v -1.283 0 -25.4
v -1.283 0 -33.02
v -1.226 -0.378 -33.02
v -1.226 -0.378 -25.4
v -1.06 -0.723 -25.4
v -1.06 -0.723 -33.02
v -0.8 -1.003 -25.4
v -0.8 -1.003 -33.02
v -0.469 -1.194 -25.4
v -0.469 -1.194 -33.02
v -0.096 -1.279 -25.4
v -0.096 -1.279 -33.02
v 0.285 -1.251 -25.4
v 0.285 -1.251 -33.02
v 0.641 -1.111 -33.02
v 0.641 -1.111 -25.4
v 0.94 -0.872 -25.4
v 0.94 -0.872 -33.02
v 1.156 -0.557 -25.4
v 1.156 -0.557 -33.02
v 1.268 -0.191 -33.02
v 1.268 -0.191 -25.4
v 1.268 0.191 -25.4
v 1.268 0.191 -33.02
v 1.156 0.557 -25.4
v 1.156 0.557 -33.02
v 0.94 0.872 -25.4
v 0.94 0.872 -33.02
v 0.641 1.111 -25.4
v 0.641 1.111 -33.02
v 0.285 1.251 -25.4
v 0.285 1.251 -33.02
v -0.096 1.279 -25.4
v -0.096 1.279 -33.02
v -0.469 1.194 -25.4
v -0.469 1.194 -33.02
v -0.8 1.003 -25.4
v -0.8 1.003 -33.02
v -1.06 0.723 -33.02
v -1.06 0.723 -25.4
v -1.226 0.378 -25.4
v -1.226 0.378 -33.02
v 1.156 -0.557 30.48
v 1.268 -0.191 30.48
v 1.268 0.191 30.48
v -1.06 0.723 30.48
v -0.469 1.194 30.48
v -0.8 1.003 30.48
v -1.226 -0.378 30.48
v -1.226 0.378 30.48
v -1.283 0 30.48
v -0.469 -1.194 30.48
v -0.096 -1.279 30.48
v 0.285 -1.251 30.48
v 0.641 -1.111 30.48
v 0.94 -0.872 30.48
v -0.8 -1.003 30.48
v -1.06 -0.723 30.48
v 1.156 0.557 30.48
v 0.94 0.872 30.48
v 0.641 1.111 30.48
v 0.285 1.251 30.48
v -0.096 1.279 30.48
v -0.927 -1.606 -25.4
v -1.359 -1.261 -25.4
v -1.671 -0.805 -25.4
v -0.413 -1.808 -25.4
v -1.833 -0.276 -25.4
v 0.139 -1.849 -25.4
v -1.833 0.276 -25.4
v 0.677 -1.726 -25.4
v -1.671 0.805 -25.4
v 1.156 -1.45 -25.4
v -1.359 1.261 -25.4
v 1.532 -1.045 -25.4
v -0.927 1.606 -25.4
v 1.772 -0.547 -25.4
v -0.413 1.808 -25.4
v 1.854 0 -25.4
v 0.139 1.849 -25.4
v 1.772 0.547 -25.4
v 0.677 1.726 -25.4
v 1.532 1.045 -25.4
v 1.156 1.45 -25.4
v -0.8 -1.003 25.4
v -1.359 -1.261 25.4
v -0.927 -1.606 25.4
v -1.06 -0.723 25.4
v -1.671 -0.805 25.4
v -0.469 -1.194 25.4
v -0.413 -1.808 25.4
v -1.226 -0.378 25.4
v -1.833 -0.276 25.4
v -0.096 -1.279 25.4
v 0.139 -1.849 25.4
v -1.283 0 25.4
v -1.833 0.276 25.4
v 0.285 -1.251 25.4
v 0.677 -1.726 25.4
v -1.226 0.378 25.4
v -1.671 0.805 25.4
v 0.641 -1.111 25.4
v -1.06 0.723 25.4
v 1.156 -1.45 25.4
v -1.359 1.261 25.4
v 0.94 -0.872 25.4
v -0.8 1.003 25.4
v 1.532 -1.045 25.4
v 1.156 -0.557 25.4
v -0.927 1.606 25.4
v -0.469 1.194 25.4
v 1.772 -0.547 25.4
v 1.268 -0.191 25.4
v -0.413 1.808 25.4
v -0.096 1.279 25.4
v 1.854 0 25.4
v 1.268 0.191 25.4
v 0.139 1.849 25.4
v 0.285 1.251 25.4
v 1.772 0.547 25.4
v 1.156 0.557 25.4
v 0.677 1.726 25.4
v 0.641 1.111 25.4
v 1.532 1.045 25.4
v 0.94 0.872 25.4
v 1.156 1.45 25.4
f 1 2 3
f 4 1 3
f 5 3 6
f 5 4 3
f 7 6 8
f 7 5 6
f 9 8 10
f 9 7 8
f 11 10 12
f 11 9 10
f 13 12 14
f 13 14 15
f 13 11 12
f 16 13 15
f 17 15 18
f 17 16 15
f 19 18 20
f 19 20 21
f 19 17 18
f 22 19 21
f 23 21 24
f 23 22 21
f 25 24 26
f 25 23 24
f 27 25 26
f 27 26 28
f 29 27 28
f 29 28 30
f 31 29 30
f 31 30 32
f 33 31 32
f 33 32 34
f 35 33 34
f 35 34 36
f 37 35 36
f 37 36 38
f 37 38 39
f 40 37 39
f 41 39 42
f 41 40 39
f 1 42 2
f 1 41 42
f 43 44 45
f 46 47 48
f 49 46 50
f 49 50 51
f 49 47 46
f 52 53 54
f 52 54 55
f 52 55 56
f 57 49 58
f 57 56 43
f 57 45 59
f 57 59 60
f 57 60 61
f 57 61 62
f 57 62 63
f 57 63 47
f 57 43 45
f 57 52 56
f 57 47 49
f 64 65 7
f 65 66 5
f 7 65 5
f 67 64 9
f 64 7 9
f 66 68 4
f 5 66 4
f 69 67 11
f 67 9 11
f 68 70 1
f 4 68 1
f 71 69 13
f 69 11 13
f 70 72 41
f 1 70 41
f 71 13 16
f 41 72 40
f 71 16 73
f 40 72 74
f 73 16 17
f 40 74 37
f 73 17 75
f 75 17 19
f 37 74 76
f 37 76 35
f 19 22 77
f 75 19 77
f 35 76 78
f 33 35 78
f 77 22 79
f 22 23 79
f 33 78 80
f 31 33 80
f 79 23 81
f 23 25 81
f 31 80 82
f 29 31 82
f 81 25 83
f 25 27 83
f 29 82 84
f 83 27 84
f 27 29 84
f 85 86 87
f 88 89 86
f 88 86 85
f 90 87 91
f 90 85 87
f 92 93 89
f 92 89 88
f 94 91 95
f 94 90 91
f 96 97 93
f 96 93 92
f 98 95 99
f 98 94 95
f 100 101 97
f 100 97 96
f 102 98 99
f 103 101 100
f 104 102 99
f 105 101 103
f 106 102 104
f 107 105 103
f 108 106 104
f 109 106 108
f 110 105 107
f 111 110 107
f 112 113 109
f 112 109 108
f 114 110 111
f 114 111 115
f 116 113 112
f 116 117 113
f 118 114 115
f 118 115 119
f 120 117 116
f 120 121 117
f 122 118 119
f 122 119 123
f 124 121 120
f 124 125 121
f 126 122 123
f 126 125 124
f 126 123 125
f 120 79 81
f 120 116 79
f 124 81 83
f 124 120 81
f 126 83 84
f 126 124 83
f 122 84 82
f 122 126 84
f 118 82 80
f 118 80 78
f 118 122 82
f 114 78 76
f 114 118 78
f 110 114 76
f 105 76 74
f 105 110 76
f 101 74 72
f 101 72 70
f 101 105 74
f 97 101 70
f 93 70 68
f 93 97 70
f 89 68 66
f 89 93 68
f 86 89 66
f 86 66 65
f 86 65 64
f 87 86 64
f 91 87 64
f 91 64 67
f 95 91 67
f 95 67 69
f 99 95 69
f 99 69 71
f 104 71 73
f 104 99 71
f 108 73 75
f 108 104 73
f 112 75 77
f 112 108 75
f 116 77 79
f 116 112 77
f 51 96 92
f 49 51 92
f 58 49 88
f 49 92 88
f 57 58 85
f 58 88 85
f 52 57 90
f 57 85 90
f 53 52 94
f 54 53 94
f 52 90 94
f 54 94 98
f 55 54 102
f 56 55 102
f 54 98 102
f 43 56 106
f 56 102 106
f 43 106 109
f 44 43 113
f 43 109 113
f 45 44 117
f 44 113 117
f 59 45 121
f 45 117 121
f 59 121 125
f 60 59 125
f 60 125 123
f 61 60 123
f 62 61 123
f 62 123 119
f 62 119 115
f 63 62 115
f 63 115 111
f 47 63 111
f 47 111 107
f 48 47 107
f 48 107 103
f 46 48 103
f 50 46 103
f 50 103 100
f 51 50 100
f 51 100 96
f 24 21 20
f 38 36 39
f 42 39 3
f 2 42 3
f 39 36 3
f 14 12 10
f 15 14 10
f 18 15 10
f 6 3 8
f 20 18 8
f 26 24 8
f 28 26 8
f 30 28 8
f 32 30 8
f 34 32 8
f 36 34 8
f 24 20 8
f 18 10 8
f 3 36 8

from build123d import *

# Parameters (mm, degrees)
SKETCH1_R           = 1.8542
BOSS_EXTRUDE1_DEPTH = 25.4
SKETCH2_R           = 1.2827
BOSS_EXTRUDE2_DEPTH = 7.62
SKETCH3_R           = 1.2827
CUT_EXTRUDE1_DEPTH  = 2.54


with BuildPart() as part:
    # Sketch1 → Boss-Extrude1 (new, symmetric)
    with BuildSketch(Plane.XY):
        Circle(SKETCH1_R)
    extrude(amount=BOSS_EXTRUDE1_DEPTH, both=True)

    # Sketch2 → Boss-Extrude2 (add)
    with BuildSketch(Plane.XY.offset(25.4)):
        with Locations(Location((0, 0, 0), (0, 0, 180))):
            Circle(SKETCH2_R)
    boss_extrude2 = extrude(amount=BOSS_EXTRUDE2_DEPTH)

    # Mirror1: Boss-Extrude2 across plane
    add(boss_extrude2.mirror(Plane.XY))

    # Sketch3 → Cut-Extrude1 (cut)
    with BuildSketch(Plane.XY.offset(33.02)):
        with Locations(Location((0, 0, 0), (0, 0, 180))):
            Circle(SKETCH3_R)
    extrude(amount=-CUT_EXTRUDE1_DEPTH, mode=Mode.SUBTRACT)


solid = part.part
